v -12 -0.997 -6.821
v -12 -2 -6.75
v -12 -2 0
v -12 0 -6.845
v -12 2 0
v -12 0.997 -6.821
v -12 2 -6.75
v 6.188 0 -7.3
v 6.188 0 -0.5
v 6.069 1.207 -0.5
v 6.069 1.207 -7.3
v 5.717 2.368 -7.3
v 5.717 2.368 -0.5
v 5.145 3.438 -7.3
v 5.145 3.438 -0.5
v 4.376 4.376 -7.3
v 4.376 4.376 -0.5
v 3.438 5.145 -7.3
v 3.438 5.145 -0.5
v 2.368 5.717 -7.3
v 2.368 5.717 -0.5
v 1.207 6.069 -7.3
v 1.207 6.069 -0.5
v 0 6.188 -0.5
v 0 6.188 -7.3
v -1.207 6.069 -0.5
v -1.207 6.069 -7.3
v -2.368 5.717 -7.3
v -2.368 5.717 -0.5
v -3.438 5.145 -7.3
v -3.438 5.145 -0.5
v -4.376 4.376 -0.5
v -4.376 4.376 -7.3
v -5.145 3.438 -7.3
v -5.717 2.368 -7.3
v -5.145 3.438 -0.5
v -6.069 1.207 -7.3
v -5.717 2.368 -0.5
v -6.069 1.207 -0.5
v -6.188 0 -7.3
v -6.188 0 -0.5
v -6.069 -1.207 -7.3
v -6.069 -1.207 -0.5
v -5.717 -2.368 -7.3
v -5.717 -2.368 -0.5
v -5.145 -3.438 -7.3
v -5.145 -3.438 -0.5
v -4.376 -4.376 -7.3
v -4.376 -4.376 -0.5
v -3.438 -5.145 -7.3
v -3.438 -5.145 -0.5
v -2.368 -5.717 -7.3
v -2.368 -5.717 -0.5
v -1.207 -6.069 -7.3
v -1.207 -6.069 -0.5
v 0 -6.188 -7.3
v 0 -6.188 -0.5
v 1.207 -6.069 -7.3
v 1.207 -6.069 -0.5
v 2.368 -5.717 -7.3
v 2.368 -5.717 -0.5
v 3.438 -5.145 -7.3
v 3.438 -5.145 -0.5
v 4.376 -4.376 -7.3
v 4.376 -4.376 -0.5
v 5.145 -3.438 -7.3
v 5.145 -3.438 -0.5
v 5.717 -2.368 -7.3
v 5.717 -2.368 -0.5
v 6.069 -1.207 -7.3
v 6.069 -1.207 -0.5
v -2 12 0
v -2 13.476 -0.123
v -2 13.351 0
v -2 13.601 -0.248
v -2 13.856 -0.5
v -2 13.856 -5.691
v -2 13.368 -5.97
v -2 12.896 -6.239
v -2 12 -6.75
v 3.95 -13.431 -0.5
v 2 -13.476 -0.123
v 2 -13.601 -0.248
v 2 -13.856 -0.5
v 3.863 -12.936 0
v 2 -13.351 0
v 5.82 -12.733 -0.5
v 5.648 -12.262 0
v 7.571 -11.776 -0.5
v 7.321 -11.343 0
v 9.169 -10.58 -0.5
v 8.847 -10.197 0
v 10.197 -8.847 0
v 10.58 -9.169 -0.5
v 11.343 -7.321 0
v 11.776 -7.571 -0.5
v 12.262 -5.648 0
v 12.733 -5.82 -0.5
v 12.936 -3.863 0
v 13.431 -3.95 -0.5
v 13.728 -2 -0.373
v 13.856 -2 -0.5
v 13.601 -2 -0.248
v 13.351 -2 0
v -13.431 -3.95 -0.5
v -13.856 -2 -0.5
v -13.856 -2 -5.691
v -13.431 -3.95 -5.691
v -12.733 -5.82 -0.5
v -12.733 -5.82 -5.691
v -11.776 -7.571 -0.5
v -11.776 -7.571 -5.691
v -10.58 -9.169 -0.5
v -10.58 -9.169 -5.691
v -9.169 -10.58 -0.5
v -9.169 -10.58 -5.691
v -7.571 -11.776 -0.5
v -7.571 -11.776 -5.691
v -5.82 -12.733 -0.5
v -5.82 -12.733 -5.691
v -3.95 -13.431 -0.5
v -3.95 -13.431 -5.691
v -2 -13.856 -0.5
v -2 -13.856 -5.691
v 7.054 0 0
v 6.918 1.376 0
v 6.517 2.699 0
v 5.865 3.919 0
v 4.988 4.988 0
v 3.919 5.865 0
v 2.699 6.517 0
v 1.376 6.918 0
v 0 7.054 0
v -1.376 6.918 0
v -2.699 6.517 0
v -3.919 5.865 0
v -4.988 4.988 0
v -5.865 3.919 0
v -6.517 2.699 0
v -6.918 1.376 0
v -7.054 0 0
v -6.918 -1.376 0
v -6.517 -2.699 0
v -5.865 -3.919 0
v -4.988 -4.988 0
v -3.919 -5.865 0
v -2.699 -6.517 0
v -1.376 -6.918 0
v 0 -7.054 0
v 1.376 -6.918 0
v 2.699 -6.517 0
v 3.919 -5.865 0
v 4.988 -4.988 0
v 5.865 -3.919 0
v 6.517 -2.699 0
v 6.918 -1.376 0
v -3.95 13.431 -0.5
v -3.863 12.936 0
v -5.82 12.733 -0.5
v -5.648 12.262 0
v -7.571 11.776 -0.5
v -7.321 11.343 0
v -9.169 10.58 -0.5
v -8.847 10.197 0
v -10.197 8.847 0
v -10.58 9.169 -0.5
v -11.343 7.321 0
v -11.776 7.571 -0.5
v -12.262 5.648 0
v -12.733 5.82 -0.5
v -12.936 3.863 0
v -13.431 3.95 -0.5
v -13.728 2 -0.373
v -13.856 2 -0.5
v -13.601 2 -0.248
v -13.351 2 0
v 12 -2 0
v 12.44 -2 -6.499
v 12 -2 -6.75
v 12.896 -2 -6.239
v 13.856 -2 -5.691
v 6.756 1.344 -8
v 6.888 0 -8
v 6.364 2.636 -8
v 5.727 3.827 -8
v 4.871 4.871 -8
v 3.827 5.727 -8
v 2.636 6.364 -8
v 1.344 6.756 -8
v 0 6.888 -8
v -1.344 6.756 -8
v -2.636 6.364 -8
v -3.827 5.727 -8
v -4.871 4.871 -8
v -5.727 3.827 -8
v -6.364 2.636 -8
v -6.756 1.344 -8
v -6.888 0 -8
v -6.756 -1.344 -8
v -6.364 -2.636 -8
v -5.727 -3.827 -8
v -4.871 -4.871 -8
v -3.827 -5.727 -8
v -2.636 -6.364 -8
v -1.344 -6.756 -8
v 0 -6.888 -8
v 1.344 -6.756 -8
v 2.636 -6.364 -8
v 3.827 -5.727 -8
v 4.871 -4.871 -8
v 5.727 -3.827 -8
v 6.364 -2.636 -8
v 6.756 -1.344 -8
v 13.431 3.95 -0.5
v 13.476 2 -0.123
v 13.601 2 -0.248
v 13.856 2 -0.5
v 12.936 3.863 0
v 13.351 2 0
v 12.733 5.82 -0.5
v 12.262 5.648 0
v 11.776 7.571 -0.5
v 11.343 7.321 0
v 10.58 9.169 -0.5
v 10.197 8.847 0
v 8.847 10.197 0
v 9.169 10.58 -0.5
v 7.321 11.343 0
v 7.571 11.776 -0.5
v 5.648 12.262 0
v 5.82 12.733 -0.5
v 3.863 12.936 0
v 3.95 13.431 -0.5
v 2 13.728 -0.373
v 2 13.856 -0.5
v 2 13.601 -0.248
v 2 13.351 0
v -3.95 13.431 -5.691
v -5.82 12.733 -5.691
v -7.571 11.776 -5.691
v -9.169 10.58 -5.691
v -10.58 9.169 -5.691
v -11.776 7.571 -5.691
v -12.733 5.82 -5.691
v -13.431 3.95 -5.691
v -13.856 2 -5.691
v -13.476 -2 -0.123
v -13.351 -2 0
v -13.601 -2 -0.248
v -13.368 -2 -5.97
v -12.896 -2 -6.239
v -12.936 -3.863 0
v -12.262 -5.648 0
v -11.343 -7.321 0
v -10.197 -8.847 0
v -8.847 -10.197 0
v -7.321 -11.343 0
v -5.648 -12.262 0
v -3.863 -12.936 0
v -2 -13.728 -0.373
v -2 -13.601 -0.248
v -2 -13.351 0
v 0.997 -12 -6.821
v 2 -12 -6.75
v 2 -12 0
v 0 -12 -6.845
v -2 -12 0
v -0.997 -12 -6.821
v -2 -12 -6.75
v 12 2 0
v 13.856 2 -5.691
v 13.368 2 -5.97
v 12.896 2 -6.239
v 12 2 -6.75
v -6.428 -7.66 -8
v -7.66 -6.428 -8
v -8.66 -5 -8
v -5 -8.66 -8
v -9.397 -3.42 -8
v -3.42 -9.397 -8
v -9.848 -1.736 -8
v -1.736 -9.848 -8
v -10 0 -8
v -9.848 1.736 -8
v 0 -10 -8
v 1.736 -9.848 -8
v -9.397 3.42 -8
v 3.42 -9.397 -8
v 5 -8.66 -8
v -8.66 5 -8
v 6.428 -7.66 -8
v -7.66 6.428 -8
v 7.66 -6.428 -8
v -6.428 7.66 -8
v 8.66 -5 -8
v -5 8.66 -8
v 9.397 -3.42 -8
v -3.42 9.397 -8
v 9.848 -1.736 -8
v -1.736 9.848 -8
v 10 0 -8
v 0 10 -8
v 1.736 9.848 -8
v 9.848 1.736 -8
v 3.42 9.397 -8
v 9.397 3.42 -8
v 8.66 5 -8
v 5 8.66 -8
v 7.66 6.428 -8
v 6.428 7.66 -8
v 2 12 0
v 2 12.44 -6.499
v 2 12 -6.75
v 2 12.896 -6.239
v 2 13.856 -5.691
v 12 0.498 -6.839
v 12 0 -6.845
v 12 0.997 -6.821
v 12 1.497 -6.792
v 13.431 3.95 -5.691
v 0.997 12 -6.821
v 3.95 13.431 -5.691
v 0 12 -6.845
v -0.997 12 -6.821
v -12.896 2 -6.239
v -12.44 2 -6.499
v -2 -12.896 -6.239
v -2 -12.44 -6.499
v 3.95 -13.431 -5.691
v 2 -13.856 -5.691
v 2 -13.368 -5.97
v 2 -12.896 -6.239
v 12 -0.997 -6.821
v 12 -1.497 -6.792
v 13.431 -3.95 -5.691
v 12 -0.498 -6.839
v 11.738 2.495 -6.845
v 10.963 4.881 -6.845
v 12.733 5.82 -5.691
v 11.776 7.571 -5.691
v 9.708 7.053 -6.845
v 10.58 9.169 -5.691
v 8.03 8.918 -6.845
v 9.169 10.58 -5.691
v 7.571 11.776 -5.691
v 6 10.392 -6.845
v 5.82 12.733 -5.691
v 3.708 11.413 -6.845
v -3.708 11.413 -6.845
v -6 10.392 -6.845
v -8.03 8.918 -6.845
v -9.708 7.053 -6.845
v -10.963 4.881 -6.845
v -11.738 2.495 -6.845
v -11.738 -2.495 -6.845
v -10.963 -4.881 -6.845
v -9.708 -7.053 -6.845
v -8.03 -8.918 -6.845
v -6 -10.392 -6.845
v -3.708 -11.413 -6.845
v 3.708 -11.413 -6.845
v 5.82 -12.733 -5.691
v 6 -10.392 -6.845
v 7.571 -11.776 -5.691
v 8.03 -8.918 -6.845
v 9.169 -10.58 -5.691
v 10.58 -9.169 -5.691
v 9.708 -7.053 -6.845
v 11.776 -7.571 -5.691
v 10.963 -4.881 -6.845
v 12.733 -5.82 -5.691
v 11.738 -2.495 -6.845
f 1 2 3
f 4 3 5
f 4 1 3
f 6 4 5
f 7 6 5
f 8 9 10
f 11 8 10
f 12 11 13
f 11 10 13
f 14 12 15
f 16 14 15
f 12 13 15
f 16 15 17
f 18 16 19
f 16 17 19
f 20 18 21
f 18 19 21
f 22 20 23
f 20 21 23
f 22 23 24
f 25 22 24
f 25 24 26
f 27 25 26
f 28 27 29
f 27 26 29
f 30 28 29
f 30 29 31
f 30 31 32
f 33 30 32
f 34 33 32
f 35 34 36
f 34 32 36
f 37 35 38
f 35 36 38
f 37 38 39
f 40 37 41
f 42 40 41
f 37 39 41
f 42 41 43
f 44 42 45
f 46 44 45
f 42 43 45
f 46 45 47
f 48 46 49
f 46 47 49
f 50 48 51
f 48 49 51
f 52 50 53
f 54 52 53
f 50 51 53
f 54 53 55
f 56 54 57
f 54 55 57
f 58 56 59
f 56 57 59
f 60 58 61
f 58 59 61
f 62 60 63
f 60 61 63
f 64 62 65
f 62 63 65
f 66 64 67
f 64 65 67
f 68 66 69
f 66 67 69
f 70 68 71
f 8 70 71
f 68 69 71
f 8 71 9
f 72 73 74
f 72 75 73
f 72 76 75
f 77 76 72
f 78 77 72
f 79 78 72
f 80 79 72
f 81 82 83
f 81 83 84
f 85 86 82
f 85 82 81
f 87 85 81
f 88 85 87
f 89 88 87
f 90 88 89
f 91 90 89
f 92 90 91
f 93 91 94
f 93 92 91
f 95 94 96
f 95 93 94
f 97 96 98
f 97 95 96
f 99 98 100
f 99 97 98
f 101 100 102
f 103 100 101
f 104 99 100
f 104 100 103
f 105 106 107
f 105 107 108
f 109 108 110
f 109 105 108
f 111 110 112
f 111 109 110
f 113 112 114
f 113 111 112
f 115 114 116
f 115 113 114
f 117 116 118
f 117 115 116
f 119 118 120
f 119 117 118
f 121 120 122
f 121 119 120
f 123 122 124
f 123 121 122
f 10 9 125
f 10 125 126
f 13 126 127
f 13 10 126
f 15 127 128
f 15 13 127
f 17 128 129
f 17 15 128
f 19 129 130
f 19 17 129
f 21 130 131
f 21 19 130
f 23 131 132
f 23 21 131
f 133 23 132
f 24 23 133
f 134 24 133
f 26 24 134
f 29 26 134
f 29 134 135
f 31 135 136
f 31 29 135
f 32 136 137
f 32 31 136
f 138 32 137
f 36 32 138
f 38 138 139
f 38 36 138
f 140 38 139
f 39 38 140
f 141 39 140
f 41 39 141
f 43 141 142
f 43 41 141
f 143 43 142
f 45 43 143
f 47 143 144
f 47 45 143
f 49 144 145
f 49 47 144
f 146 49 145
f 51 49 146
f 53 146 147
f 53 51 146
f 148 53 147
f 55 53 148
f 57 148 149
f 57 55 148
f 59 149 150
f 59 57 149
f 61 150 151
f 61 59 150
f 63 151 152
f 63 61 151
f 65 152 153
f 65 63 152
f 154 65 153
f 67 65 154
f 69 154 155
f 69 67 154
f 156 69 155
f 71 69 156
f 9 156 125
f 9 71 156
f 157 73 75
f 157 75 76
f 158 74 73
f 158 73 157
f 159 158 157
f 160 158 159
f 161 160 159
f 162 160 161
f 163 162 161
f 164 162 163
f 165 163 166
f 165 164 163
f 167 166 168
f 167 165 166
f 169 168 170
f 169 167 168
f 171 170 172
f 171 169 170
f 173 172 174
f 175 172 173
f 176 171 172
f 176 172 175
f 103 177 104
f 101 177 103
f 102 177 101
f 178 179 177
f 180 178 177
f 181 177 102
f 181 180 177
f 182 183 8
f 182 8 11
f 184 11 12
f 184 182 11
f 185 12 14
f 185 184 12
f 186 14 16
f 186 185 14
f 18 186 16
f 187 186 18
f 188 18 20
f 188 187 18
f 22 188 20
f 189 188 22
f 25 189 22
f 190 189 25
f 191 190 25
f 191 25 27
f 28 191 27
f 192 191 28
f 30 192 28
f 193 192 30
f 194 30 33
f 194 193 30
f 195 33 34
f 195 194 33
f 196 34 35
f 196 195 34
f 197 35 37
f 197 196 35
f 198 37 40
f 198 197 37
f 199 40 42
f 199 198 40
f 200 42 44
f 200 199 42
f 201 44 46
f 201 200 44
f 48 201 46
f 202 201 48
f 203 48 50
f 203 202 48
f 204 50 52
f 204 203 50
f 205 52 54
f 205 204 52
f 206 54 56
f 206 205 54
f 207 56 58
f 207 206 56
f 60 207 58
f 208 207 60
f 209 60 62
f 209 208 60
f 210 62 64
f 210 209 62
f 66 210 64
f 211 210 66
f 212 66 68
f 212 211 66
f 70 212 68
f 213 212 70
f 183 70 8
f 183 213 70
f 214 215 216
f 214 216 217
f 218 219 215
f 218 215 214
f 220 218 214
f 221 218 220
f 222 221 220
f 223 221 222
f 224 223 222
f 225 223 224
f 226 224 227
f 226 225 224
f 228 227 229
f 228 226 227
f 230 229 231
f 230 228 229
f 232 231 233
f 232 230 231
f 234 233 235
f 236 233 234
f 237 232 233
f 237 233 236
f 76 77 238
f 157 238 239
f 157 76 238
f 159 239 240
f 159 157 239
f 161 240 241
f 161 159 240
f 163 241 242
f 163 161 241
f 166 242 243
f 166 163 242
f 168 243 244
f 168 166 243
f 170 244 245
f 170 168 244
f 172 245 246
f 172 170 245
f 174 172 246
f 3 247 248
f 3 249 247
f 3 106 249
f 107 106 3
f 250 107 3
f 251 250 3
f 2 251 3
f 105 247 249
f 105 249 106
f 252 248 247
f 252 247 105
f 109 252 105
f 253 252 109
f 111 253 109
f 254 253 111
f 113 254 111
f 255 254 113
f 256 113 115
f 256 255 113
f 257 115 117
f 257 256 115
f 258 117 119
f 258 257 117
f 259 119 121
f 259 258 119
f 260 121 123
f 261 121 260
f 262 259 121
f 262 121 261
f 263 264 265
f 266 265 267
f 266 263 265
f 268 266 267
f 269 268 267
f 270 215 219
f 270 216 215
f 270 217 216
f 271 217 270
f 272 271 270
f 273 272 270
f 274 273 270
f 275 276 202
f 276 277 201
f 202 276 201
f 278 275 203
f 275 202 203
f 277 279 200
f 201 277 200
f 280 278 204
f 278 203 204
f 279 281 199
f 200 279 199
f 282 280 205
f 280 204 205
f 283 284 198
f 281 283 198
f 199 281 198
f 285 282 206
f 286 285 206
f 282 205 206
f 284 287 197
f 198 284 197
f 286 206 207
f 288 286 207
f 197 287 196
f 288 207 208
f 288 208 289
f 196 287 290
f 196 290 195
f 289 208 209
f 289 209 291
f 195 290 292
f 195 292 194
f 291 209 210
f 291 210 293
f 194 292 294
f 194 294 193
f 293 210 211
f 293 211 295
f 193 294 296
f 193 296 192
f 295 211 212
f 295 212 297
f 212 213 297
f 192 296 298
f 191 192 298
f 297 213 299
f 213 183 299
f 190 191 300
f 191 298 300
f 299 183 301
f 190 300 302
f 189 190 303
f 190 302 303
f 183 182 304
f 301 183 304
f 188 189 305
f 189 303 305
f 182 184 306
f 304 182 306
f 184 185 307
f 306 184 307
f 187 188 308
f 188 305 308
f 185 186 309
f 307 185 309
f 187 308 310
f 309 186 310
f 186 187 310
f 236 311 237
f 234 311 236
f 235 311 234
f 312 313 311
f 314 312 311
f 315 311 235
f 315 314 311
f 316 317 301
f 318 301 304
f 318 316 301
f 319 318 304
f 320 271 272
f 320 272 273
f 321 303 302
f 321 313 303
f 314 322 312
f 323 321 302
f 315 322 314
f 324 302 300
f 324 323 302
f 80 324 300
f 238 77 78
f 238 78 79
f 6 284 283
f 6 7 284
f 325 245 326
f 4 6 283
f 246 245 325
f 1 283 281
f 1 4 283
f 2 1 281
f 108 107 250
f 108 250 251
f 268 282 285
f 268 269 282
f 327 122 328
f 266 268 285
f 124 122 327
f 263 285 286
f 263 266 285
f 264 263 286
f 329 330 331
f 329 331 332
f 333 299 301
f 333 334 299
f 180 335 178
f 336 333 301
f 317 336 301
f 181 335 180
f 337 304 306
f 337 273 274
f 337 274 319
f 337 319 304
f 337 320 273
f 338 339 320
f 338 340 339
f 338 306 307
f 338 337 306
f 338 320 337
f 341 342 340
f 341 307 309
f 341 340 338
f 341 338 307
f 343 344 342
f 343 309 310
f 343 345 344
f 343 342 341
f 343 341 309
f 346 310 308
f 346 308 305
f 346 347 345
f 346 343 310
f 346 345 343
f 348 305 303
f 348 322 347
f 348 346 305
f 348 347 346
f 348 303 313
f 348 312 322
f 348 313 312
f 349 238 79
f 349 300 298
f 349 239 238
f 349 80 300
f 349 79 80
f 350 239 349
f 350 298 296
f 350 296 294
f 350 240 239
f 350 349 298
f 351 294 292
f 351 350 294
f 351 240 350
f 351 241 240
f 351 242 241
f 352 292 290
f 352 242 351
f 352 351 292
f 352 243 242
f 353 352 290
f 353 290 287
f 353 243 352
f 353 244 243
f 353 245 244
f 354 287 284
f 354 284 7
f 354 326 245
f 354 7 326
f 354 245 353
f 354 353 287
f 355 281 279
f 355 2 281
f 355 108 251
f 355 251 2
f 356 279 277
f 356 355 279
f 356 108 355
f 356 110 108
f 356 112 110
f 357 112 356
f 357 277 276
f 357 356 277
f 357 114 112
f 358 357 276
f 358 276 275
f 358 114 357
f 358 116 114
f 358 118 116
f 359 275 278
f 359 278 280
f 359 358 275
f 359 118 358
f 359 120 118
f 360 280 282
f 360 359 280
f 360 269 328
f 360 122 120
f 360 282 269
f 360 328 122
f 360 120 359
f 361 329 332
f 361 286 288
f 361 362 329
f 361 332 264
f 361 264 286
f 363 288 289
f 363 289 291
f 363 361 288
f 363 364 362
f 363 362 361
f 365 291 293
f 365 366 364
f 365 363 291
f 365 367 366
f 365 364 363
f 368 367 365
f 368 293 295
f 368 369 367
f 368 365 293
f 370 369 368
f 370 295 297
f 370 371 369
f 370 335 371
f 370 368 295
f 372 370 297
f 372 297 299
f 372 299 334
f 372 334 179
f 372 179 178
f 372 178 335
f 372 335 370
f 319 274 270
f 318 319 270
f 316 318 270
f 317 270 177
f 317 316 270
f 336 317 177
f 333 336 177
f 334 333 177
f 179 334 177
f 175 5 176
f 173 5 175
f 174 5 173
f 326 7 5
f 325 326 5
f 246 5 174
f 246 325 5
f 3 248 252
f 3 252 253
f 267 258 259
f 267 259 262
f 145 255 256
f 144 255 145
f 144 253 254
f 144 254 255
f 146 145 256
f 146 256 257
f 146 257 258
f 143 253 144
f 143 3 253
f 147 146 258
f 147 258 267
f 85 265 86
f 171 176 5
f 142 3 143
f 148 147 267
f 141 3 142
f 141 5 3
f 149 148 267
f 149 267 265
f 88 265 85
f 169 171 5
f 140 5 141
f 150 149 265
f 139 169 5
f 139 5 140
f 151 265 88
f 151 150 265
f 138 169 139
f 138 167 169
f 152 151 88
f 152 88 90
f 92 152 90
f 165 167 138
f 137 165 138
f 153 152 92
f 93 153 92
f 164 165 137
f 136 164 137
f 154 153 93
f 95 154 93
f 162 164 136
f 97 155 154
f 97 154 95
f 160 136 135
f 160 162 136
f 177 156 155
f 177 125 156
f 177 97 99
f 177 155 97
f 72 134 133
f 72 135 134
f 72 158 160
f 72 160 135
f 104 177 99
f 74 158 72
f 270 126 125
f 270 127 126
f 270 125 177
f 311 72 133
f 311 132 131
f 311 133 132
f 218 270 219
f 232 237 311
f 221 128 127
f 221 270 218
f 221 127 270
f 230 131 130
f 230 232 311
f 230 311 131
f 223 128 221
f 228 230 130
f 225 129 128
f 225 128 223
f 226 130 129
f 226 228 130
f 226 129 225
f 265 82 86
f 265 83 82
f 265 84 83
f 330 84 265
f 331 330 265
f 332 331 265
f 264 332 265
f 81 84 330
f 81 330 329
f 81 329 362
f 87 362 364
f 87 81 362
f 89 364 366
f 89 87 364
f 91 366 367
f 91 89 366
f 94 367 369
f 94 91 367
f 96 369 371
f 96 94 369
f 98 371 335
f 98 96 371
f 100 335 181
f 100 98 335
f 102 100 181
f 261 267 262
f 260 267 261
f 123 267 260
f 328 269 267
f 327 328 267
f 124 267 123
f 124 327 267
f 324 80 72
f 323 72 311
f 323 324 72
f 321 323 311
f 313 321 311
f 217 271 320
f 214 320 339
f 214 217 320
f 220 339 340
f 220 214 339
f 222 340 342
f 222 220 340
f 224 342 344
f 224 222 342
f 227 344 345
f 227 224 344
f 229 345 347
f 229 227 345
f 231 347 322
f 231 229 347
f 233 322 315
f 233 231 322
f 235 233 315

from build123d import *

# Parameters (mm, degrees)
SKETCH1_R        = 14
SKETCH1_R_2      = 6.188
BASENUT_DEPTH    = 8
CHAMFER1_SIZE    = 0.5
ENDCHAMFER_SIZE  = 0.866025404
ENDCHAMFER_SIZE2 = 0.5
CHAMFER2_SIZE    = 0.7
SLOTCUT_DEPTH    = 27.474268868
SLOTPAT_COUNT    = 4


with BuildPart() as part:
    # Sketch1 → BaseNut (new body)
    with BuildSketch(Plane.XY):
        Circle(SKETCH1_R)
        Circle(SKETCH1_R_2, mode=Mode.SUBTRACT)
    extrude(amount=-BASENUT_DEPTH)

    # Sketch2 → StepCut (revolve, cut)
    with BuildSketch(Plane(origin=(0, 0, 0), x_dir=(1, 0, 0), z_dir=(0, 1, 0)), mode=Mode.PRIVATE) as stepcut_sk:
        Polygon((-14, 8), (-10, 8), (-14, 5.690598923), align=None)
    revolve(stepcut_sk.sketch.rotate(Axis((0, 0, -4.560481664), (0, 0, 1)), 180), axis=Axis((0, 0, -4.560481664), (0, 0, 1)), mode=Mode.SUBTRACT)

    # Chamfer1
    chamfer1_edges = [part.edges().sort_by_distance(p)[0] for p in [
        (-14, 0, 0),
    ]]
    chamfer(chamfer1_edges, length=CHAMFER1_SIZE)

    # EndChamfer
    endchamfer_edges = [part.edges().sort_by_distance(p)[0] for p in [
        (-6.188, 0, 0),
    ]]
    endchamfer_side = [part.faces().sort_by_distance(p)[0] for p in [
        (-13.118162338, 0, 0),
    ]]
    chamfer(endchamfer_edges, length=ENDCHAMFER_SIZE, length2=ENDCHAMFER_SIZE2, reference=endchamfer_side[0])

    # Chamfer2
    chamfer2_edges = [part.edges().sort_by_distance(p)[0] for p in [
        (-6.188, 0, -8),
    ]]
    chamfer(chamfer2_edges, length=CHAMFER2_SIZE)

    # Sketch3 → SlotCut (cut, through all)
    with BuildSketch(Plane(origin=(-3.554280188, 4.131027526, -8), x_dir=(-1, 0, 0), z_dir=(0, 0, -1))):
        with BuildLine():
            Line((-5.554280188, -16.131027526), (-1.554280188, -16.131027526))
            Line((-1.554280188, -16.131027526), (-1.554280188, -17.987433987))
            ThreePointArc((-1.554280188, -17.987433987), (-3.554280188, -18.131027526), (-5.554280188, -17.987433987))
            Line((-5.554280188, -17.987433987), (-5.554280188, -16.131027526))
        make_face()
    slotcut = extrude(amount=-SLOTCUT_DEPTH, mode=Mode.SUBTRACT)

    # SlotPat: SlotCut ×4 about axis
    slotpat_axis = Axis((0, 0, -4.560481664), (0, 0, 1))
    for i in range(1, SLOTPAT_COUNT):
        add(slotcut.rotate(slotpat_axis, i * 360 / SLOTPAT_COUNT), mode=Mode.SUBTRACT)


solid = part.part
